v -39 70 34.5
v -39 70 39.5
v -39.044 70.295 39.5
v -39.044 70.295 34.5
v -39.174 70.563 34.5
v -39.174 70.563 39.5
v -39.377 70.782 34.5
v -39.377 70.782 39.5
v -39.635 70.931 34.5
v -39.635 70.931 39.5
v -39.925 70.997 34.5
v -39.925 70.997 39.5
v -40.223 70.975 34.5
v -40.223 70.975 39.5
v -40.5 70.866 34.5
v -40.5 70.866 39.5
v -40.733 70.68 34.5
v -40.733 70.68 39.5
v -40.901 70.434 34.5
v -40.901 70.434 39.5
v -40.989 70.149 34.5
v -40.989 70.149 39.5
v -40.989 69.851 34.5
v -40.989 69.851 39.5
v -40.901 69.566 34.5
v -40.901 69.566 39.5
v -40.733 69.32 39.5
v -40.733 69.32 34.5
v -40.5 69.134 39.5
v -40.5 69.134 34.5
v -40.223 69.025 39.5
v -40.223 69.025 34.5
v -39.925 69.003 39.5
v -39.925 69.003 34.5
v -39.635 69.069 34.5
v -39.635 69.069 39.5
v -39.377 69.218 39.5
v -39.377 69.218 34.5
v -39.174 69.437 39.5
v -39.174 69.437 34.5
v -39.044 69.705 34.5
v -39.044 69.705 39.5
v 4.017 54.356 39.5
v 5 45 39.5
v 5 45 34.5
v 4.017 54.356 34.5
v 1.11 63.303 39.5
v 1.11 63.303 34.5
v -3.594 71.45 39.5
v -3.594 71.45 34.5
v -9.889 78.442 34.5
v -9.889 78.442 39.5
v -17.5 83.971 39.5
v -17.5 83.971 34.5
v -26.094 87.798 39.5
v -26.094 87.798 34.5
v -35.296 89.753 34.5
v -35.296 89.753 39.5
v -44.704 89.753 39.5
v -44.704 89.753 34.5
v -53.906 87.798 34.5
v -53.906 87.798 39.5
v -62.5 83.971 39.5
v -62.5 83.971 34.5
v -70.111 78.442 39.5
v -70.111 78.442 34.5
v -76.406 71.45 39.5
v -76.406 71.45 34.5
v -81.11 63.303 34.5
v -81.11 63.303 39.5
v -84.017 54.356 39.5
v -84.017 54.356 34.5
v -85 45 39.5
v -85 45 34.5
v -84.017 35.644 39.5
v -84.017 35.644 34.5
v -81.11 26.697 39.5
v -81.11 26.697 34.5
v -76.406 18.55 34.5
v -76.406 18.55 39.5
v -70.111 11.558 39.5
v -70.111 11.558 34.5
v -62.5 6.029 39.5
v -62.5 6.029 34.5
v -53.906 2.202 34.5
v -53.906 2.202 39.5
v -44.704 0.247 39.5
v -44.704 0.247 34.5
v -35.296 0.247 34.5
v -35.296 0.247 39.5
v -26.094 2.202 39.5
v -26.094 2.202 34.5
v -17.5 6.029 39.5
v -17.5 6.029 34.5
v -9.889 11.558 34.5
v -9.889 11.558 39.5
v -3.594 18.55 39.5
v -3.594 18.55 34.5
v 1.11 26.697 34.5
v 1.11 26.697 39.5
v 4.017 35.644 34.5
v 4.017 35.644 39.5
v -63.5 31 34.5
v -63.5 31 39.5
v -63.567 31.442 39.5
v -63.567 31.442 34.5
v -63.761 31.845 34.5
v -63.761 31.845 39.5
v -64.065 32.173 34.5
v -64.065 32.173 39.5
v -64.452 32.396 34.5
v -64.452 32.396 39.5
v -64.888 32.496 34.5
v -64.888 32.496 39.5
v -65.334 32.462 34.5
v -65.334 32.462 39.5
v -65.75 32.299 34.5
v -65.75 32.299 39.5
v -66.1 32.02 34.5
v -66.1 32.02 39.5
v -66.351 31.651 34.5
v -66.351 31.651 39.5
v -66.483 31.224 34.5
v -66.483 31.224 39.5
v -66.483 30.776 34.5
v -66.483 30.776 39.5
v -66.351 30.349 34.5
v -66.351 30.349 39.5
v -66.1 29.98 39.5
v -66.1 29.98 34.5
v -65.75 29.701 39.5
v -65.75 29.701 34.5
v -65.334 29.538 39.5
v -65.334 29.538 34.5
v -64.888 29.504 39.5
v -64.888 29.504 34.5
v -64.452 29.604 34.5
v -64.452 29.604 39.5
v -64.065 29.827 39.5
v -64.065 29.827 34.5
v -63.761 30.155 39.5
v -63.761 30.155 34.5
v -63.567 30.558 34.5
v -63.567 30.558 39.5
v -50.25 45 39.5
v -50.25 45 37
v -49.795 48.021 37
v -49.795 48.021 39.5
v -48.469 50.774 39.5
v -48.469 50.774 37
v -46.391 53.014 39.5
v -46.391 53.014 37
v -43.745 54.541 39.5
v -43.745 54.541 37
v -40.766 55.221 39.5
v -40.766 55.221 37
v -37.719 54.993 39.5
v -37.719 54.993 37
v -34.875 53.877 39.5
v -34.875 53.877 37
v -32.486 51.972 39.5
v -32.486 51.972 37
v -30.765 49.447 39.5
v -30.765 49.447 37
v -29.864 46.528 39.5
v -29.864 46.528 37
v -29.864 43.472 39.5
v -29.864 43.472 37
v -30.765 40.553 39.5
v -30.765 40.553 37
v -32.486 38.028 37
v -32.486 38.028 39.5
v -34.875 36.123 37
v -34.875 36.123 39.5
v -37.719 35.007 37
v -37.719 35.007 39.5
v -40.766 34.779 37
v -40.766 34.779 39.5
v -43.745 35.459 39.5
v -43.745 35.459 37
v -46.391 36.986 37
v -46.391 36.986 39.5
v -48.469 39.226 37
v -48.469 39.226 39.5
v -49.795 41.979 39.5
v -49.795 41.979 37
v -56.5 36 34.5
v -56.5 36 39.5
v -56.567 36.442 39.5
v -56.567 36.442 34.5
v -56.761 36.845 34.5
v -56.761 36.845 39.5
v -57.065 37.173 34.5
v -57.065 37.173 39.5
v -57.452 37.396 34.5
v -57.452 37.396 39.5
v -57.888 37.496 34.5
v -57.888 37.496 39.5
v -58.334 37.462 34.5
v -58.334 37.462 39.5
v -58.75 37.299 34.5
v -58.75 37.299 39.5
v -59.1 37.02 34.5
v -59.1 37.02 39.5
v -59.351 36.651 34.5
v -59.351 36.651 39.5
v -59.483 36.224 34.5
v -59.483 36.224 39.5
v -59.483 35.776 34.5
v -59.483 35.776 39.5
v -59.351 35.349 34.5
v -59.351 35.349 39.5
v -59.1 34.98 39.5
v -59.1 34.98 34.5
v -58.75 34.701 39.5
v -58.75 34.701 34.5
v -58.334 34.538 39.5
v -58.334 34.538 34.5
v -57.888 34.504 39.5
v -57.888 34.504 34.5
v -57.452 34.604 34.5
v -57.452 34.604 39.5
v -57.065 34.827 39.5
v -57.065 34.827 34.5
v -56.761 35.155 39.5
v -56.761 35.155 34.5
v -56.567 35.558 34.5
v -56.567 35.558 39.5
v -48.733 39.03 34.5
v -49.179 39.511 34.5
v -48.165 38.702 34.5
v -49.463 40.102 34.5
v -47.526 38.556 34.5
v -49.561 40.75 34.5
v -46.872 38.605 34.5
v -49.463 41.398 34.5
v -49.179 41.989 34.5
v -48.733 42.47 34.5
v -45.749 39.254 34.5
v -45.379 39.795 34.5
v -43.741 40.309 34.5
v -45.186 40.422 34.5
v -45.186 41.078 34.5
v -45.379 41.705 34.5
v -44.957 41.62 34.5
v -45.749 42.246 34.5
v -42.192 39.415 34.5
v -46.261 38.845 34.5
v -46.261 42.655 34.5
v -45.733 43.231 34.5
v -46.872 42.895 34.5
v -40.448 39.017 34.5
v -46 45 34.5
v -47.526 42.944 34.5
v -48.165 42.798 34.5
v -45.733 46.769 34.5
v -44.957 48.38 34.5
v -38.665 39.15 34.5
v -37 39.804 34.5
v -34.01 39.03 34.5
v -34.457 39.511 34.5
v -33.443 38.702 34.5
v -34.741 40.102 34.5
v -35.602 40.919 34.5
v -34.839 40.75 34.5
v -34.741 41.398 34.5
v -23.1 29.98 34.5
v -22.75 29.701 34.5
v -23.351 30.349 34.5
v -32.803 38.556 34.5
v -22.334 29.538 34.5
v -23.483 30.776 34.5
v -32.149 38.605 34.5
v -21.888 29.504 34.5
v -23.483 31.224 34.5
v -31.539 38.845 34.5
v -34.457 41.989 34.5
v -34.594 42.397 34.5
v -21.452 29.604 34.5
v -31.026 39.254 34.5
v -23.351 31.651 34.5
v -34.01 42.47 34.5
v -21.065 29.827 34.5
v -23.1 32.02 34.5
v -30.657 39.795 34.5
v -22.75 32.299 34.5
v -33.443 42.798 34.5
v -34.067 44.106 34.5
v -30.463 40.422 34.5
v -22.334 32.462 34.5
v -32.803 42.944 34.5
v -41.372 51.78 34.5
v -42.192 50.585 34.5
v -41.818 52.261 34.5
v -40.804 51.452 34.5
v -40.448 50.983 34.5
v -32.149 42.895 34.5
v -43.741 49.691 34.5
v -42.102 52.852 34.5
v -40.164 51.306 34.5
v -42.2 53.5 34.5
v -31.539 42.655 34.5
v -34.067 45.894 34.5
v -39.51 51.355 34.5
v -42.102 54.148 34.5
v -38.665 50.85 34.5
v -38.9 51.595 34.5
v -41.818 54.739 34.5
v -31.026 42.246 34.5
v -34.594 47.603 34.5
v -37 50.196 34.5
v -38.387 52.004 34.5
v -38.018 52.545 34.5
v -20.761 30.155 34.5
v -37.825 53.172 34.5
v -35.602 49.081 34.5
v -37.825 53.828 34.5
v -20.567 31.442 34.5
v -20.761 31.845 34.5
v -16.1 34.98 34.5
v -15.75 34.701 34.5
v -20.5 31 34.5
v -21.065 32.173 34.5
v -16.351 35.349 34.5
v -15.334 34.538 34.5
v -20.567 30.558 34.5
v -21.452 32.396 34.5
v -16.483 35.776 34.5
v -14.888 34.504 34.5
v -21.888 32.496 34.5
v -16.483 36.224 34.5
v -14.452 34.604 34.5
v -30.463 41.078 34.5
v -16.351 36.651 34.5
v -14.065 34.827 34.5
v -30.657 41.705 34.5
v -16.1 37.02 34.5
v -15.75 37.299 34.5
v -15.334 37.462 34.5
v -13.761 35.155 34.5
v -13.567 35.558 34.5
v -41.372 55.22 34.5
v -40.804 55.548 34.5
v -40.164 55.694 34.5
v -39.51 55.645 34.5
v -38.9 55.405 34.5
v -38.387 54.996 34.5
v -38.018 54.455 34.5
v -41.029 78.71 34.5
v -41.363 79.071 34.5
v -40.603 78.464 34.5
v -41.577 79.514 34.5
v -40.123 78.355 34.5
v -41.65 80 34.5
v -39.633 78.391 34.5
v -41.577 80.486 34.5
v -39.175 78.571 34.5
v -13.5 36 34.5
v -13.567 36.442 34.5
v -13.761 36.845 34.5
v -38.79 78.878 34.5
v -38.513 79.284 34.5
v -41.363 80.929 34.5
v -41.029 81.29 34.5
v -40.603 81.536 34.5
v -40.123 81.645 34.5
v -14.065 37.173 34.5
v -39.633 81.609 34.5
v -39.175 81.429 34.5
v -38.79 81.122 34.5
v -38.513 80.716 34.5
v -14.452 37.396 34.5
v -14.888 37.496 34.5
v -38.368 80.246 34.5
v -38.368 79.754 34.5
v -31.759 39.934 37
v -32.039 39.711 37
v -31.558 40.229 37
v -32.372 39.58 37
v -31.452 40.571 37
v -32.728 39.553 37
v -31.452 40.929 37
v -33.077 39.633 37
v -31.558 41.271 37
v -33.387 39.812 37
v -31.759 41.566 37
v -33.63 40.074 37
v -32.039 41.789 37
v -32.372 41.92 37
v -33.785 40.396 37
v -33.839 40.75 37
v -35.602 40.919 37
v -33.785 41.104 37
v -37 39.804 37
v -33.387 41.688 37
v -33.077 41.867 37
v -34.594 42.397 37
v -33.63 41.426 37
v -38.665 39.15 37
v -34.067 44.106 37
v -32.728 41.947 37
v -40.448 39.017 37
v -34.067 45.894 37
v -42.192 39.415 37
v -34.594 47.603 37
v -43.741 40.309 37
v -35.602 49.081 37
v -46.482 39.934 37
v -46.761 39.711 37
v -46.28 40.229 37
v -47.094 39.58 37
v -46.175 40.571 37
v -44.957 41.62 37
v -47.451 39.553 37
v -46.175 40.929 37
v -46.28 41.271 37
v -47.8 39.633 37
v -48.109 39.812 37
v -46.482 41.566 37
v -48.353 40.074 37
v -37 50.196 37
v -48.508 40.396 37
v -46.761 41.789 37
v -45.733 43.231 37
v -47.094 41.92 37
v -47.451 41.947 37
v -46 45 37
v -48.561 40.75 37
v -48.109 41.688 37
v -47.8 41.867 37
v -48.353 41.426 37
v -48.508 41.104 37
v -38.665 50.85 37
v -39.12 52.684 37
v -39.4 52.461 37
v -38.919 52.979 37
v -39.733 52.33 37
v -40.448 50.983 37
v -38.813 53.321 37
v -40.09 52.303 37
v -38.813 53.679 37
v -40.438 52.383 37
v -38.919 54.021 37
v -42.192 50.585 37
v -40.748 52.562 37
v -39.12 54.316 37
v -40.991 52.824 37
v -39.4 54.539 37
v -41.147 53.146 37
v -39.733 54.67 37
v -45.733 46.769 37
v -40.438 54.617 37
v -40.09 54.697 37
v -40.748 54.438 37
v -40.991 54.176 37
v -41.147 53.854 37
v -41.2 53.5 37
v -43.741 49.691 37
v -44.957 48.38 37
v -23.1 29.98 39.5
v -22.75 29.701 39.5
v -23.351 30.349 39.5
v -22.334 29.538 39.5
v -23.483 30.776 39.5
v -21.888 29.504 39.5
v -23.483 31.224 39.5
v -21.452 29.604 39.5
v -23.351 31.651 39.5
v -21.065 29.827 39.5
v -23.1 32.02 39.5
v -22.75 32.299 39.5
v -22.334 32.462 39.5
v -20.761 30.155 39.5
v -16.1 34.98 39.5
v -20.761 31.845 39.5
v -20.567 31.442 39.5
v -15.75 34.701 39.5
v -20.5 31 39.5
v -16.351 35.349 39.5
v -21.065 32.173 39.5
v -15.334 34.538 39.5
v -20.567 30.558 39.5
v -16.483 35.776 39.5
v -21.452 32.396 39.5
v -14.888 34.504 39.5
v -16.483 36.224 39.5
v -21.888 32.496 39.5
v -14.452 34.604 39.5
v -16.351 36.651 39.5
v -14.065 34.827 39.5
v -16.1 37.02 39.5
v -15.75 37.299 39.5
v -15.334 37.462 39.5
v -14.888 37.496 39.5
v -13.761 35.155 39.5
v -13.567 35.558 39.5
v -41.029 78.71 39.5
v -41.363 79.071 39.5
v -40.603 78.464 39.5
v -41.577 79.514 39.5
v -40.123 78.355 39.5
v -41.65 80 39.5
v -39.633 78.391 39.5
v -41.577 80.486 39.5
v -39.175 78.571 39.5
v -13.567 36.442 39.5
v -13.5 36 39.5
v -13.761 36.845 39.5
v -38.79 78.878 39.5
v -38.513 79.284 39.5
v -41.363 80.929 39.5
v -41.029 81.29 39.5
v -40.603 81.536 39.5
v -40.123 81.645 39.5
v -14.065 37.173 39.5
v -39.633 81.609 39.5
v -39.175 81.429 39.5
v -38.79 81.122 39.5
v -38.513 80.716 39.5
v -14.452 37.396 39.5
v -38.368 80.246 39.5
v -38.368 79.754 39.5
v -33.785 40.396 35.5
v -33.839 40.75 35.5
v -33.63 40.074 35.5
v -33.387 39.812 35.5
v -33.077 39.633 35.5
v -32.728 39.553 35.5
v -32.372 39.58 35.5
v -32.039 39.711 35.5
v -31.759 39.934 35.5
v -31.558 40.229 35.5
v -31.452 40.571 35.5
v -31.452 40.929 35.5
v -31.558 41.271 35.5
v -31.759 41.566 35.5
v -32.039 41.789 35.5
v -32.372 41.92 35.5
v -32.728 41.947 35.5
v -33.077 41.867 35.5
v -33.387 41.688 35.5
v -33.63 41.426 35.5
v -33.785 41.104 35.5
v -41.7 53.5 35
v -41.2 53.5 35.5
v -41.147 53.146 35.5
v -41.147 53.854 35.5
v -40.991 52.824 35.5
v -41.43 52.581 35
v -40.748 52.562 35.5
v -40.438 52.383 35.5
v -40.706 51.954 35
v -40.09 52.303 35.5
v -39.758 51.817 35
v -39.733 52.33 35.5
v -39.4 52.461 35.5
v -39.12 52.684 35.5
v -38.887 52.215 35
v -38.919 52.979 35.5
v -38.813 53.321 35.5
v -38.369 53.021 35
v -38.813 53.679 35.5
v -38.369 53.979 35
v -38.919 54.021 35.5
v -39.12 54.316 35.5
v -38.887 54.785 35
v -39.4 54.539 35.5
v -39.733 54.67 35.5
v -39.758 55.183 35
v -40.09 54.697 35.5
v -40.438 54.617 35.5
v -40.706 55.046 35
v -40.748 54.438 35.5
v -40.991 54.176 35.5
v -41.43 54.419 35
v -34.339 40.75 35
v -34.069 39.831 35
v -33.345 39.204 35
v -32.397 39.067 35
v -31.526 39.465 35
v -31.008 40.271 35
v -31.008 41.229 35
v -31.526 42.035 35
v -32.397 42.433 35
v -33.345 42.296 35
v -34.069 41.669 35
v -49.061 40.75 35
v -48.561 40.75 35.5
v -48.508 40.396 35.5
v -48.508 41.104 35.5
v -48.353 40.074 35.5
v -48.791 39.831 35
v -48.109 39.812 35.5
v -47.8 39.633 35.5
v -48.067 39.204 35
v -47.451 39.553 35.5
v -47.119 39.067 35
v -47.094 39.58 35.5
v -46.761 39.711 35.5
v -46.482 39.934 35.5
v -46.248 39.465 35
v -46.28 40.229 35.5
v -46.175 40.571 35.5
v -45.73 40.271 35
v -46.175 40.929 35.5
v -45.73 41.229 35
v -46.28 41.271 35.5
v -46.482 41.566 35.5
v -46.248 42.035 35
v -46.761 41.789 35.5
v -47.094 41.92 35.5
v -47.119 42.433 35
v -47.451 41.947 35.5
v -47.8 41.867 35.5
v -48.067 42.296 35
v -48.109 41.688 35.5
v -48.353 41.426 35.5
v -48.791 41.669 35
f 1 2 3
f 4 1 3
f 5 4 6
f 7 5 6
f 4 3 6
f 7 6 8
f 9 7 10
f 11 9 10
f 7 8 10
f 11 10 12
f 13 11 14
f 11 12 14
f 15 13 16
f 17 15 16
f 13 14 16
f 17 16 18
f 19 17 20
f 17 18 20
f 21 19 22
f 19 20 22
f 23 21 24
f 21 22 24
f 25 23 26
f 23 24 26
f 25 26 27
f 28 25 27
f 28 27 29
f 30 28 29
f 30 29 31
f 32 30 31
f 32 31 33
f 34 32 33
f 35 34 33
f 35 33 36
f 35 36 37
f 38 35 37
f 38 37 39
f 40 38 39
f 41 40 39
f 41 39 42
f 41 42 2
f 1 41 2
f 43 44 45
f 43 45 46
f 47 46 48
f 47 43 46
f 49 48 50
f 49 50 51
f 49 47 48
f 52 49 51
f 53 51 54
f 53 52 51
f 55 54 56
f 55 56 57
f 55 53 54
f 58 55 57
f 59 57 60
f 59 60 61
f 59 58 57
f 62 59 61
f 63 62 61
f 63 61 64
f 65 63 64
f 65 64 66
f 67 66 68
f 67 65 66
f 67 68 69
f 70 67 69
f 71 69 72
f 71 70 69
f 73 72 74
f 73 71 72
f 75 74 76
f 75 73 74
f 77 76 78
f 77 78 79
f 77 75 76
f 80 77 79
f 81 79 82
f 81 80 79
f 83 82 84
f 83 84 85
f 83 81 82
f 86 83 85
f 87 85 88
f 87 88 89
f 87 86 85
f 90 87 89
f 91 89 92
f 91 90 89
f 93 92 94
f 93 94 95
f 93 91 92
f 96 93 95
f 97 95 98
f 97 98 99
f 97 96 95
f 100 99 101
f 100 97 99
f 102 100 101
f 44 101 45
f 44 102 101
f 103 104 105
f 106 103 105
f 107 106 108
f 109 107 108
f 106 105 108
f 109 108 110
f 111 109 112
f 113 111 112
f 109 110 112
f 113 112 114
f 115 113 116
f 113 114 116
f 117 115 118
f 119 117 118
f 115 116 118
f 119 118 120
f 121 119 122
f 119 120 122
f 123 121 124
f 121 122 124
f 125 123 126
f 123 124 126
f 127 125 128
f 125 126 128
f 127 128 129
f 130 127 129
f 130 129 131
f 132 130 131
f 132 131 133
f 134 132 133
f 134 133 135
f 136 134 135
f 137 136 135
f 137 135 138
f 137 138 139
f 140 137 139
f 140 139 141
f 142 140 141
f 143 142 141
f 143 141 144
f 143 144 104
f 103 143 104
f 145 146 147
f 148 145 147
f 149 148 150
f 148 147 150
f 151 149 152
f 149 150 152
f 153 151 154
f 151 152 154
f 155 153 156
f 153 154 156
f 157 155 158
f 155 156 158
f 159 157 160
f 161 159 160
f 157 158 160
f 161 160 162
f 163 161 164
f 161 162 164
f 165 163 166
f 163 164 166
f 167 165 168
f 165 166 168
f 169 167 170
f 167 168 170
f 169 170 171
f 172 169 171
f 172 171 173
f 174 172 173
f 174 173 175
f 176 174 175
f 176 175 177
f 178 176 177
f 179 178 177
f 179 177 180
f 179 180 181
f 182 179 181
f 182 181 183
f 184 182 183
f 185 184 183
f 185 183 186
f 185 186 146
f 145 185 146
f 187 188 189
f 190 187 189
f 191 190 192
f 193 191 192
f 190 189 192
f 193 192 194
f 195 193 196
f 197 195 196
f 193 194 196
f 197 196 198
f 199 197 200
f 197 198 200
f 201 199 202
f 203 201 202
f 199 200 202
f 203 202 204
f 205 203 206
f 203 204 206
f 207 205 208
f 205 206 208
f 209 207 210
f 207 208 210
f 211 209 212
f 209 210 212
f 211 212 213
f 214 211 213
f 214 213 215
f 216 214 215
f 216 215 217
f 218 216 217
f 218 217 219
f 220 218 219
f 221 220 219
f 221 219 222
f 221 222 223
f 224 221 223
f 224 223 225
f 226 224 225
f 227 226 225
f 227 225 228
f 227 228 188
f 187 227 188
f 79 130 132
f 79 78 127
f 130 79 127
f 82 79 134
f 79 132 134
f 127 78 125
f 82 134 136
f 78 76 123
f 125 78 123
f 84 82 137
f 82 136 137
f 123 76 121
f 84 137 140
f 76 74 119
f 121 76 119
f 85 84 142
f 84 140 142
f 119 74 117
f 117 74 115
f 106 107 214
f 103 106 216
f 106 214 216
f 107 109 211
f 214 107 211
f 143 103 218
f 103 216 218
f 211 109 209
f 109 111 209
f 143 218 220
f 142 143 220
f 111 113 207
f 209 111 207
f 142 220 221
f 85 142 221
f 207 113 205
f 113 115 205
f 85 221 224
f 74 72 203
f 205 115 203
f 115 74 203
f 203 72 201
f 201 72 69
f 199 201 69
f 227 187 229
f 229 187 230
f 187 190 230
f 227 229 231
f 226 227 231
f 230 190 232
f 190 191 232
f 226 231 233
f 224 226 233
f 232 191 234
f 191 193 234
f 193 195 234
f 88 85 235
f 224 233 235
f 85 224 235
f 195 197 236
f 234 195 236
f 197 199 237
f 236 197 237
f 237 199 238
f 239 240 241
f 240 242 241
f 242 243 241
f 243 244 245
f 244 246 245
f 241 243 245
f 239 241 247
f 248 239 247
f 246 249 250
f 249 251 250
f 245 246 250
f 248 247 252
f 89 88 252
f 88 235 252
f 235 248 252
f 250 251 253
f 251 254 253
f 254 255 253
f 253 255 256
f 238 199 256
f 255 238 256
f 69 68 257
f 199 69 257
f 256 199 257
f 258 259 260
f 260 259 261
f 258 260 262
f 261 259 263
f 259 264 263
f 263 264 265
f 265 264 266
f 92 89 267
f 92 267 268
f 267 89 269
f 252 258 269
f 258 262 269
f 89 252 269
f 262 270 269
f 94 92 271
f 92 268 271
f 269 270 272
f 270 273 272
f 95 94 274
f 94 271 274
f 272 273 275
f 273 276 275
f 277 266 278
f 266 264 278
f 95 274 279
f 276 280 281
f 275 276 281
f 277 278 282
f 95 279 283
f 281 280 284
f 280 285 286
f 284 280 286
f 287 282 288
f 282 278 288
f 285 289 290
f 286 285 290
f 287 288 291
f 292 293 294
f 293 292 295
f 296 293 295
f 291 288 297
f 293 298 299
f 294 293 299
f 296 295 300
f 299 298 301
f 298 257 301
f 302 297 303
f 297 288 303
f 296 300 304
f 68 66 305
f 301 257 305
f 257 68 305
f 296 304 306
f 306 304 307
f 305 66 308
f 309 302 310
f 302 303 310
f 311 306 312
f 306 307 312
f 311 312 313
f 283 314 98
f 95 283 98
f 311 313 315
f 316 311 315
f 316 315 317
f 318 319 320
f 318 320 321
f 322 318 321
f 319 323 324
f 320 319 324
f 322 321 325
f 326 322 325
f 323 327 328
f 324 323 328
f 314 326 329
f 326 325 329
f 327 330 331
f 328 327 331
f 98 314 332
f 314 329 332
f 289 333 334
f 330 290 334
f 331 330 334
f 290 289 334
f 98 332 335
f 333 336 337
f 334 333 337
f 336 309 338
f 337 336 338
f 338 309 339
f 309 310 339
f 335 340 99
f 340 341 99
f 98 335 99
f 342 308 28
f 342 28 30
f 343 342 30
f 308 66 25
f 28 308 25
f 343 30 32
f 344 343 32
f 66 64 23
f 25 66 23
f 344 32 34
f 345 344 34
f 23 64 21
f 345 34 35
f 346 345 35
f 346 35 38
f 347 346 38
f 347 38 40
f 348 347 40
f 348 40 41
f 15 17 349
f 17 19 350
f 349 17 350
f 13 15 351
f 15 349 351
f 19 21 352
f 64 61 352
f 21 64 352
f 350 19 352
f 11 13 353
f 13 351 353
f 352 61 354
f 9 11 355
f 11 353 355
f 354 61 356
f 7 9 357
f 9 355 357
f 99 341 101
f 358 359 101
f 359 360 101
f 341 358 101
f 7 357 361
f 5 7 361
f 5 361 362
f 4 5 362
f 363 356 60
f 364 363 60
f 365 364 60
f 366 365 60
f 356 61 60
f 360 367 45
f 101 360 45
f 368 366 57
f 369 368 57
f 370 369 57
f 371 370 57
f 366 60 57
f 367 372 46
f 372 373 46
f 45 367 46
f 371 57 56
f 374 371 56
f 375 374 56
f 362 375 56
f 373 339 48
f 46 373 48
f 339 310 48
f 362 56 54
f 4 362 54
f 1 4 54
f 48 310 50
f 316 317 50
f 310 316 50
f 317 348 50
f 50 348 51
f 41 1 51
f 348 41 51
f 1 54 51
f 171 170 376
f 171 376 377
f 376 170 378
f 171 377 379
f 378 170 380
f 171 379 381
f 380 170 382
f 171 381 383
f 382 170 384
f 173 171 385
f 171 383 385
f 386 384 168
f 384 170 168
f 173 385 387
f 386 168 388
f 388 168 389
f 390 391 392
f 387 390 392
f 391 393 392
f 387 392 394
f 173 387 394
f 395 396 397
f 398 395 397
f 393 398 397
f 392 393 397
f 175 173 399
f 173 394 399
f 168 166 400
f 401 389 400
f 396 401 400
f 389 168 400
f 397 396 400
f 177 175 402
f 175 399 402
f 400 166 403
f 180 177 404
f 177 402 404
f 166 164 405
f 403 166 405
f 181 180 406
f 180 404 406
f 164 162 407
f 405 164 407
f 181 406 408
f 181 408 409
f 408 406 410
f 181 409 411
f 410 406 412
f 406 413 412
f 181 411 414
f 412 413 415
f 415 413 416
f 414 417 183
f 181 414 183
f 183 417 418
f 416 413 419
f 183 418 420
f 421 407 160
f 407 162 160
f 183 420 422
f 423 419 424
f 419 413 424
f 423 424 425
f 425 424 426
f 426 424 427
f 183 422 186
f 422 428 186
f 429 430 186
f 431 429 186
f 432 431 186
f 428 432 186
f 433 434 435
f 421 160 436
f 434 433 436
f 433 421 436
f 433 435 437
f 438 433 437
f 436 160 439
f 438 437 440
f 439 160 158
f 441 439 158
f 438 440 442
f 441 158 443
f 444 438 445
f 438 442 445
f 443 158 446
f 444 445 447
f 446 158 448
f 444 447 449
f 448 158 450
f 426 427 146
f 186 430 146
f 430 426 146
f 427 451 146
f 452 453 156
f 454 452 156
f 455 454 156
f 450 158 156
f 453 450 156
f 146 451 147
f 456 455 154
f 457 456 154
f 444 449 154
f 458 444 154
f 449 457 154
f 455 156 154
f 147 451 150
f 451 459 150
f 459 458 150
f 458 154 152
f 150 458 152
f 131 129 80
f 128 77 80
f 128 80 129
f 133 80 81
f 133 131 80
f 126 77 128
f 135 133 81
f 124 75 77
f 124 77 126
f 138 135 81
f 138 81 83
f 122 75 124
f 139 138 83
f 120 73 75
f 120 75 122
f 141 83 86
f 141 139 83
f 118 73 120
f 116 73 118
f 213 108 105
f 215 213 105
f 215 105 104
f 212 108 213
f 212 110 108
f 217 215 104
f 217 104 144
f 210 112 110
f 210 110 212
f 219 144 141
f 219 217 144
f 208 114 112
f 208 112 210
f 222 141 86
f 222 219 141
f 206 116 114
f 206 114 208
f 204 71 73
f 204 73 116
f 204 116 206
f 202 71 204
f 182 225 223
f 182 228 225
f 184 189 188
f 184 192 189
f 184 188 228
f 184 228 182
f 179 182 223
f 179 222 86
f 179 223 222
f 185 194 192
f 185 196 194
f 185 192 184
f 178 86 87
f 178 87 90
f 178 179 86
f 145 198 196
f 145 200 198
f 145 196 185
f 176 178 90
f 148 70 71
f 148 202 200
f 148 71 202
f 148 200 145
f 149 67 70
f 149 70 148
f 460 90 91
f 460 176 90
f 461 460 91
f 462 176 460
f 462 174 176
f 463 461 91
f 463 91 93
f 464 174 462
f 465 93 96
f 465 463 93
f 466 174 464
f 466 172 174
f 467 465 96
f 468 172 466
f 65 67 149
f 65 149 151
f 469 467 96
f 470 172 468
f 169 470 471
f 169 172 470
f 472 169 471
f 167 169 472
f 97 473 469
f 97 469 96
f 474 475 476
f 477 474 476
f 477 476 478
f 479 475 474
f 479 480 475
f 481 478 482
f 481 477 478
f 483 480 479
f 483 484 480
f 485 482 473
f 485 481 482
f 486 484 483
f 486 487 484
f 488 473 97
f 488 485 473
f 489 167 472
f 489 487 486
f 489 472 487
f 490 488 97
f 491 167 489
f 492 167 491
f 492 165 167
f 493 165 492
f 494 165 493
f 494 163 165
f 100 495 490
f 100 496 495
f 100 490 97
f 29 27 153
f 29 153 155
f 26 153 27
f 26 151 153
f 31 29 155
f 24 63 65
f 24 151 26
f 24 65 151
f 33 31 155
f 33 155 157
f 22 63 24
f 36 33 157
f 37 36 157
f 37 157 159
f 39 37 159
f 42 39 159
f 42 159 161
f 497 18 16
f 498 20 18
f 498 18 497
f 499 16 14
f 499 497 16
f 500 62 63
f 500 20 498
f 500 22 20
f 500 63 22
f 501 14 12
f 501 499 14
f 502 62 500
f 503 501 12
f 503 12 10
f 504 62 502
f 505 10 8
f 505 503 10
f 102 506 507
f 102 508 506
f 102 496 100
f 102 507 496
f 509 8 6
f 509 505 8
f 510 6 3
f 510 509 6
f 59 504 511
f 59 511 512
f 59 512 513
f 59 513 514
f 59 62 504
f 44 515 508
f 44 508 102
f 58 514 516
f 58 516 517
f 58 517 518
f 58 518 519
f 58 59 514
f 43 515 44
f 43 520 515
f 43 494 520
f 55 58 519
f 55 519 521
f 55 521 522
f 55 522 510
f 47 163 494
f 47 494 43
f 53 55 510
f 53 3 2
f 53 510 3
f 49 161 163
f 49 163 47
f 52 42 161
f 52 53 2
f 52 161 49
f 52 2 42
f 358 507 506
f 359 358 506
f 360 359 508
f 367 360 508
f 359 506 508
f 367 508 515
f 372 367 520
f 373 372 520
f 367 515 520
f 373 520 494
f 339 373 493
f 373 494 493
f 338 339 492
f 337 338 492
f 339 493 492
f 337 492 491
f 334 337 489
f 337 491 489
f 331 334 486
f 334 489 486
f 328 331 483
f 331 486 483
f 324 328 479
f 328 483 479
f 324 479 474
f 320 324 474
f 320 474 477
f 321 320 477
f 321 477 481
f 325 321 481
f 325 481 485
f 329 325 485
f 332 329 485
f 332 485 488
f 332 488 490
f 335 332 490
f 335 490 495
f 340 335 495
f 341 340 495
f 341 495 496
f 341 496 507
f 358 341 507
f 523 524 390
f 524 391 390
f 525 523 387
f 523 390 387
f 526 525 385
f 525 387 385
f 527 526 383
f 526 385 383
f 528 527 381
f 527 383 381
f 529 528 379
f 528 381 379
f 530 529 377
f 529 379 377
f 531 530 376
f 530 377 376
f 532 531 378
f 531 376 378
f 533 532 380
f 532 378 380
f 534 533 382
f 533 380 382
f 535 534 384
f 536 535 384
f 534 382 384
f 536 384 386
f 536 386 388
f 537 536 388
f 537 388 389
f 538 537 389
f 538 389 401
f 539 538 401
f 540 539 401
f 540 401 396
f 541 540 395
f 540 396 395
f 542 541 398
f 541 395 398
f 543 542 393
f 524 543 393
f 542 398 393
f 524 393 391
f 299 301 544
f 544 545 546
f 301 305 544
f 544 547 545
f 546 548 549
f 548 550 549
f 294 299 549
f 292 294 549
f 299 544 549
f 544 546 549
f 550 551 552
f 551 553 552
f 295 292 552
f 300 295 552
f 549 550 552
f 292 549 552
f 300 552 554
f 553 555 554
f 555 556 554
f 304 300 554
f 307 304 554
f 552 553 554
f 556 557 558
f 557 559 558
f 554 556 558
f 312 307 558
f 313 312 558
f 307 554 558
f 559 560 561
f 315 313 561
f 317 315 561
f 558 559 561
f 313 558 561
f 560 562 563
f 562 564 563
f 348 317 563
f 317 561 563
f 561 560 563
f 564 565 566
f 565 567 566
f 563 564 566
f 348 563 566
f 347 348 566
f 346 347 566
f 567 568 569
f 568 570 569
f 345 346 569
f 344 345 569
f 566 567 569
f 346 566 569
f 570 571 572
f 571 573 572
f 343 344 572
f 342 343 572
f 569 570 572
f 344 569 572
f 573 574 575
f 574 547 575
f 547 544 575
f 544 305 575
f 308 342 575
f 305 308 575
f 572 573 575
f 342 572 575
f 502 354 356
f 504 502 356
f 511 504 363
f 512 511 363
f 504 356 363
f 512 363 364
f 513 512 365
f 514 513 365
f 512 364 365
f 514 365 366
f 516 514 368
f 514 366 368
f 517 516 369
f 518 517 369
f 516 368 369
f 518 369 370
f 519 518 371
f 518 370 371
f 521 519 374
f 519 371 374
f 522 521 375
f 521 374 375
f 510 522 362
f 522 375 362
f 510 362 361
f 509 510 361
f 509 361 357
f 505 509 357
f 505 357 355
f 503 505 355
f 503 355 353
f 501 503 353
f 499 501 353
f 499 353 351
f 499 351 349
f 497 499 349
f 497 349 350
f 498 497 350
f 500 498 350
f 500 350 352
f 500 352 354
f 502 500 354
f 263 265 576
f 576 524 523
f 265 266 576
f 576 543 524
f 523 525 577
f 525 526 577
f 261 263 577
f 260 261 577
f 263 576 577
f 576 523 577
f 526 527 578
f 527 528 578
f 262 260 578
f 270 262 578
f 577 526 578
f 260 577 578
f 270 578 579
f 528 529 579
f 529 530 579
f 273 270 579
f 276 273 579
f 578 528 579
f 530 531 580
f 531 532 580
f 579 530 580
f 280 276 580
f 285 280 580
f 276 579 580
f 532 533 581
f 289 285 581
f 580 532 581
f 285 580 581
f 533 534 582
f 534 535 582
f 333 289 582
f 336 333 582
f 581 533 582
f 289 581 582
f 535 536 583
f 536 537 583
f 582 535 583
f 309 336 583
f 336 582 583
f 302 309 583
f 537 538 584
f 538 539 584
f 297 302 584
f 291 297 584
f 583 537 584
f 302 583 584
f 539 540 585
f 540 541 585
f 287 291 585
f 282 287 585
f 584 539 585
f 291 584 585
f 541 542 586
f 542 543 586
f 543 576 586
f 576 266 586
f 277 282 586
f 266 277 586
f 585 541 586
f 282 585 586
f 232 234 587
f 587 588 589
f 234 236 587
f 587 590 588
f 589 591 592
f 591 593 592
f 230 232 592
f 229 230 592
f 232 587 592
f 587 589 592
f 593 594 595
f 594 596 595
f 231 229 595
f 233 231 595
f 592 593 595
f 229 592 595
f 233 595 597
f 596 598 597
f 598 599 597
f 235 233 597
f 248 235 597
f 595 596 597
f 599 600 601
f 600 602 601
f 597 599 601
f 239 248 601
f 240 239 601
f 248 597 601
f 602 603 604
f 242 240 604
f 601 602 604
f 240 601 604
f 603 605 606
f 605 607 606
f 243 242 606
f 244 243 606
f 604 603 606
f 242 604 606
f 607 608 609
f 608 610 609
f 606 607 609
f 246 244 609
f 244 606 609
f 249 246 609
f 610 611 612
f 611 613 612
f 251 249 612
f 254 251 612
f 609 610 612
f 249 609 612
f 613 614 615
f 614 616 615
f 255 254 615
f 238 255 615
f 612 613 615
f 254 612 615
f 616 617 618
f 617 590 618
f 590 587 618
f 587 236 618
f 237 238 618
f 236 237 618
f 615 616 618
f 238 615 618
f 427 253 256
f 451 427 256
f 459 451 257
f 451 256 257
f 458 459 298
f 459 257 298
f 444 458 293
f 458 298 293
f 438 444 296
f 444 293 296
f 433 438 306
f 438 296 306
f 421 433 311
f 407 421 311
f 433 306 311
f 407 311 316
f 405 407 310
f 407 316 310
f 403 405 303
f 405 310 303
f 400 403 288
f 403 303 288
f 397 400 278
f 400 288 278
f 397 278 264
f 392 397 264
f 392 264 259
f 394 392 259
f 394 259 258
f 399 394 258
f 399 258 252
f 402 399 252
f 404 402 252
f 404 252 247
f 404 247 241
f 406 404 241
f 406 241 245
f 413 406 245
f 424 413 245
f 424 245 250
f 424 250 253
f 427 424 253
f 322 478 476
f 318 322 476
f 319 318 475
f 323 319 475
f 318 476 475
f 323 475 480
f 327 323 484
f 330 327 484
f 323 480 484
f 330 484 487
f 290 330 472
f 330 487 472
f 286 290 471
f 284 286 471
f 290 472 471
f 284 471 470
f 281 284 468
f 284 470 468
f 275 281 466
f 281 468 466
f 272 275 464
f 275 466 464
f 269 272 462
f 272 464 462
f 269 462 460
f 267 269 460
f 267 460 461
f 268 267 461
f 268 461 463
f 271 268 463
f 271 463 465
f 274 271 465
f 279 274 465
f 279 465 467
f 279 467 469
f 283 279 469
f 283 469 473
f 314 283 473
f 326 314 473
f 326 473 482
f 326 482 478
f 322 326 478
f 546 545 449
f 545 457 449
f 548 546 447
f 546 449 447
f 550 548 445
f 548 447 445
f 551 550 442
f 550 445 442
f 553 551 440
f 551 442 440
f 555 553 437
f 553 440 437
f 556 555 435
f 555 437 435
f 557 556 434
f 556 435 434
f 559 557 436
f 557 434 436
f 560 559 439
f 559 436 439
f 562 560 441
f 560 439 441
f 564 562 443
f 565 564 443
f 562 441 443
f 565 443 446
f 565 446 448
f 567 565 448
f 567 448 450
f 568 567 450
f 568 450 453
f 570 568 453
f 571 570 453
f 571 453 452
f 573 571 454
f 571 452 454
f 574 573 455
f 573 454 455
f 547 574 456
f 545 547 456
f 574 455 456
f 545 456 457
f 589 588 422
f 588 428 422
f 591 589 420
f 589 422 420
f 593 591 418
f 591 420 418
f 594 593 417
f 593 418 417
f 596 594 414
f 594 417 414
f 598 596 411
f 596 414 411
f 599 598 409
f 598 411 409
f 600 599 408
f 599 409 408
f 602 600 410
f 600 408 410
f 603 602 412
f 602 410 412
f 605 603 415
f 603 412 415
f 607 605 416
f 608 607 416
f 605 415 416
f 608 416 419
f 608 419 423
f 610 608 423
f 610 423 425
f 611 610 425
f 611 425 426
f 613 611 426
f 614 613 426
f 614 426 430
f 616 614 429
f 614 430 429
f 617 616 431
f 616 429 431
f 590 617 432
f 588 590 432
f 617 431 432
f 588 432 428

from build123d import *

# Parameters (mm, degrees)
SKETCH1_R                                       = 45
BOSS_EXTRUDE1_DEPTH                             = 5
F_20_5_20_5_DIAMETER_HOLE1_D                    = 20.5
F_20_5_20_5_DIAMETER_HOLE1_DEPTH                = 2.5
F_12_0_12_DIAMETER_HOLE1_D                      = 12
CSK_FOR_M2_FLAT_HEAD_MACHINE_SCREW1_D           = 2.4
CSK_FOR_M2_FLAT_HEAD_MACHINE_SCREW1_DEPTH       = 22.75
CSK_FOR_M2_FLAT_HEAD_MACHINE_SCREW1_CSINK_D     = 4.4
CSK_FOR_M2_FLAT_HEAD_MACHINE_SCREW1_CSINK_ANGLE = 90
CSK_FOR_M2_FLAT_HEAD_MACHINE_SCREW1_TIP         = 0.721032743
M4X0_7_TAPPED_HOLE1_D                           = 3.3
SKETCH15_R                                      = 1.5
M3_TAPPED_HOLE_DEPTH                            = 124.895116934
SKETCH16_R                                      = 1
F_2MM_PIN_DEPTH                                 = 124.895116934


with BuildPart() as part:
    # Sketch1 → Boss-Extrude1 (new body)
    with BuildSketch(Plane.XY.offset(39.5)):
        with Locations((-40, 45)):
            Circle(SKETCH1_R)
    extrude(amount=-BOSS_EXTRUDE1_DEPTH)

    # Ø20.5 (20.5) Diameter Hole1
    with Locations(Plane.XY.offset(39.5)):
        with Locations((-40, 45)):
            Hole(F_20_5_20_5_DIAMETER_HOLE1_D / 2, depth=F_20_5_20_5_DIAMETER_HOLE1_DEPTH)

    # Ø12.0 (12) Diameter Hole1 (through all)
    with Locations(Plane.XY.offset(39.5)):
        with Locations((-40, 45)):
            Hole(F_12_0_12_DIAMETER_HOLE1_D / 2)

    # CSK for M2 Flat Head Machine Screw1
    with Locations(Plane(origin=(0, 0, 34.5), x_dir=(1, 0, 0), z_dir=(0, 0, -1))):
        with Locations((-40, -53.5), (-32.638784068, -40.75), (-47.361215932, -40.75)):
            CounterSinkHole(CSK_FOR_M2_FLAT_HEAD_MACHINE_SCREW1_D / 2, CSK_FOR_M2_FLAT_HEAD_MACHINE_SCREW1_CSINK_D / 2, depth=CSK_FOR_M2_FLAT_HEAD_MACHINE_SCREW1_DEPTH, counter_sink_angle=CSK_FOR_M2_FLAT_HEAD_MACHINE_SCREW1_CSINK_ANGLE)
            with Locations((0, 0, -(CSK_FOR_M2_FLAT_HEAD_MACHINE_SCREW1_DEPTH + CSK_FOR_M2_FLAT_HEAD_MACHINE_SCREW1_TIP / 2))):  # 118° drill point
                Cone(0, CSK_FOR_M2_FLAT_HEAD_MACHINE_SCREW1_D / 2, CSK_FOR_M2_FLAT_HEAD_MACHINE_SCREW1_TIP, mode=Mode.SUBTRACT)

    # M4x0.7 Tapped Hole1 (through all)
    with Locations(Plane.XY.offset(39.5)):
        with Locations((-40, 80)):
            Hole(M4X0_7_TAPPED_HOLE1_D / 2)

    # Sketch15 → M3 Tapped Hole (cut, through all)
    with BuildSketch(Plane.XY.offset(39.5)):
        with Locations((-58, 36)):
            Circle(SKETCH15_R)
        with Locations((-65, 31)):
            Circle(SKETCH15_R)
        with Locations((-15, 36)):
            Circle(SKETCH15_R)
        with Locations((-22, 31)):
            Circle(SKETCH15_R)
    extrude(amount=-M3_TAPPED_HOLE_DEPTH, mode=Mode.SUBTRACT)

    # Sketch16 → 2mm Pin (cut, through all)
    with BuildSketch(Plane.XY.offset(39.5)):
        with Locations((-40, 70)):
            Circle(SKETCH16_R)
    extrude(amount=-F_2MM_PIN_DEPTH, mode=Mode.SUBTRACT)


solid = part.part
